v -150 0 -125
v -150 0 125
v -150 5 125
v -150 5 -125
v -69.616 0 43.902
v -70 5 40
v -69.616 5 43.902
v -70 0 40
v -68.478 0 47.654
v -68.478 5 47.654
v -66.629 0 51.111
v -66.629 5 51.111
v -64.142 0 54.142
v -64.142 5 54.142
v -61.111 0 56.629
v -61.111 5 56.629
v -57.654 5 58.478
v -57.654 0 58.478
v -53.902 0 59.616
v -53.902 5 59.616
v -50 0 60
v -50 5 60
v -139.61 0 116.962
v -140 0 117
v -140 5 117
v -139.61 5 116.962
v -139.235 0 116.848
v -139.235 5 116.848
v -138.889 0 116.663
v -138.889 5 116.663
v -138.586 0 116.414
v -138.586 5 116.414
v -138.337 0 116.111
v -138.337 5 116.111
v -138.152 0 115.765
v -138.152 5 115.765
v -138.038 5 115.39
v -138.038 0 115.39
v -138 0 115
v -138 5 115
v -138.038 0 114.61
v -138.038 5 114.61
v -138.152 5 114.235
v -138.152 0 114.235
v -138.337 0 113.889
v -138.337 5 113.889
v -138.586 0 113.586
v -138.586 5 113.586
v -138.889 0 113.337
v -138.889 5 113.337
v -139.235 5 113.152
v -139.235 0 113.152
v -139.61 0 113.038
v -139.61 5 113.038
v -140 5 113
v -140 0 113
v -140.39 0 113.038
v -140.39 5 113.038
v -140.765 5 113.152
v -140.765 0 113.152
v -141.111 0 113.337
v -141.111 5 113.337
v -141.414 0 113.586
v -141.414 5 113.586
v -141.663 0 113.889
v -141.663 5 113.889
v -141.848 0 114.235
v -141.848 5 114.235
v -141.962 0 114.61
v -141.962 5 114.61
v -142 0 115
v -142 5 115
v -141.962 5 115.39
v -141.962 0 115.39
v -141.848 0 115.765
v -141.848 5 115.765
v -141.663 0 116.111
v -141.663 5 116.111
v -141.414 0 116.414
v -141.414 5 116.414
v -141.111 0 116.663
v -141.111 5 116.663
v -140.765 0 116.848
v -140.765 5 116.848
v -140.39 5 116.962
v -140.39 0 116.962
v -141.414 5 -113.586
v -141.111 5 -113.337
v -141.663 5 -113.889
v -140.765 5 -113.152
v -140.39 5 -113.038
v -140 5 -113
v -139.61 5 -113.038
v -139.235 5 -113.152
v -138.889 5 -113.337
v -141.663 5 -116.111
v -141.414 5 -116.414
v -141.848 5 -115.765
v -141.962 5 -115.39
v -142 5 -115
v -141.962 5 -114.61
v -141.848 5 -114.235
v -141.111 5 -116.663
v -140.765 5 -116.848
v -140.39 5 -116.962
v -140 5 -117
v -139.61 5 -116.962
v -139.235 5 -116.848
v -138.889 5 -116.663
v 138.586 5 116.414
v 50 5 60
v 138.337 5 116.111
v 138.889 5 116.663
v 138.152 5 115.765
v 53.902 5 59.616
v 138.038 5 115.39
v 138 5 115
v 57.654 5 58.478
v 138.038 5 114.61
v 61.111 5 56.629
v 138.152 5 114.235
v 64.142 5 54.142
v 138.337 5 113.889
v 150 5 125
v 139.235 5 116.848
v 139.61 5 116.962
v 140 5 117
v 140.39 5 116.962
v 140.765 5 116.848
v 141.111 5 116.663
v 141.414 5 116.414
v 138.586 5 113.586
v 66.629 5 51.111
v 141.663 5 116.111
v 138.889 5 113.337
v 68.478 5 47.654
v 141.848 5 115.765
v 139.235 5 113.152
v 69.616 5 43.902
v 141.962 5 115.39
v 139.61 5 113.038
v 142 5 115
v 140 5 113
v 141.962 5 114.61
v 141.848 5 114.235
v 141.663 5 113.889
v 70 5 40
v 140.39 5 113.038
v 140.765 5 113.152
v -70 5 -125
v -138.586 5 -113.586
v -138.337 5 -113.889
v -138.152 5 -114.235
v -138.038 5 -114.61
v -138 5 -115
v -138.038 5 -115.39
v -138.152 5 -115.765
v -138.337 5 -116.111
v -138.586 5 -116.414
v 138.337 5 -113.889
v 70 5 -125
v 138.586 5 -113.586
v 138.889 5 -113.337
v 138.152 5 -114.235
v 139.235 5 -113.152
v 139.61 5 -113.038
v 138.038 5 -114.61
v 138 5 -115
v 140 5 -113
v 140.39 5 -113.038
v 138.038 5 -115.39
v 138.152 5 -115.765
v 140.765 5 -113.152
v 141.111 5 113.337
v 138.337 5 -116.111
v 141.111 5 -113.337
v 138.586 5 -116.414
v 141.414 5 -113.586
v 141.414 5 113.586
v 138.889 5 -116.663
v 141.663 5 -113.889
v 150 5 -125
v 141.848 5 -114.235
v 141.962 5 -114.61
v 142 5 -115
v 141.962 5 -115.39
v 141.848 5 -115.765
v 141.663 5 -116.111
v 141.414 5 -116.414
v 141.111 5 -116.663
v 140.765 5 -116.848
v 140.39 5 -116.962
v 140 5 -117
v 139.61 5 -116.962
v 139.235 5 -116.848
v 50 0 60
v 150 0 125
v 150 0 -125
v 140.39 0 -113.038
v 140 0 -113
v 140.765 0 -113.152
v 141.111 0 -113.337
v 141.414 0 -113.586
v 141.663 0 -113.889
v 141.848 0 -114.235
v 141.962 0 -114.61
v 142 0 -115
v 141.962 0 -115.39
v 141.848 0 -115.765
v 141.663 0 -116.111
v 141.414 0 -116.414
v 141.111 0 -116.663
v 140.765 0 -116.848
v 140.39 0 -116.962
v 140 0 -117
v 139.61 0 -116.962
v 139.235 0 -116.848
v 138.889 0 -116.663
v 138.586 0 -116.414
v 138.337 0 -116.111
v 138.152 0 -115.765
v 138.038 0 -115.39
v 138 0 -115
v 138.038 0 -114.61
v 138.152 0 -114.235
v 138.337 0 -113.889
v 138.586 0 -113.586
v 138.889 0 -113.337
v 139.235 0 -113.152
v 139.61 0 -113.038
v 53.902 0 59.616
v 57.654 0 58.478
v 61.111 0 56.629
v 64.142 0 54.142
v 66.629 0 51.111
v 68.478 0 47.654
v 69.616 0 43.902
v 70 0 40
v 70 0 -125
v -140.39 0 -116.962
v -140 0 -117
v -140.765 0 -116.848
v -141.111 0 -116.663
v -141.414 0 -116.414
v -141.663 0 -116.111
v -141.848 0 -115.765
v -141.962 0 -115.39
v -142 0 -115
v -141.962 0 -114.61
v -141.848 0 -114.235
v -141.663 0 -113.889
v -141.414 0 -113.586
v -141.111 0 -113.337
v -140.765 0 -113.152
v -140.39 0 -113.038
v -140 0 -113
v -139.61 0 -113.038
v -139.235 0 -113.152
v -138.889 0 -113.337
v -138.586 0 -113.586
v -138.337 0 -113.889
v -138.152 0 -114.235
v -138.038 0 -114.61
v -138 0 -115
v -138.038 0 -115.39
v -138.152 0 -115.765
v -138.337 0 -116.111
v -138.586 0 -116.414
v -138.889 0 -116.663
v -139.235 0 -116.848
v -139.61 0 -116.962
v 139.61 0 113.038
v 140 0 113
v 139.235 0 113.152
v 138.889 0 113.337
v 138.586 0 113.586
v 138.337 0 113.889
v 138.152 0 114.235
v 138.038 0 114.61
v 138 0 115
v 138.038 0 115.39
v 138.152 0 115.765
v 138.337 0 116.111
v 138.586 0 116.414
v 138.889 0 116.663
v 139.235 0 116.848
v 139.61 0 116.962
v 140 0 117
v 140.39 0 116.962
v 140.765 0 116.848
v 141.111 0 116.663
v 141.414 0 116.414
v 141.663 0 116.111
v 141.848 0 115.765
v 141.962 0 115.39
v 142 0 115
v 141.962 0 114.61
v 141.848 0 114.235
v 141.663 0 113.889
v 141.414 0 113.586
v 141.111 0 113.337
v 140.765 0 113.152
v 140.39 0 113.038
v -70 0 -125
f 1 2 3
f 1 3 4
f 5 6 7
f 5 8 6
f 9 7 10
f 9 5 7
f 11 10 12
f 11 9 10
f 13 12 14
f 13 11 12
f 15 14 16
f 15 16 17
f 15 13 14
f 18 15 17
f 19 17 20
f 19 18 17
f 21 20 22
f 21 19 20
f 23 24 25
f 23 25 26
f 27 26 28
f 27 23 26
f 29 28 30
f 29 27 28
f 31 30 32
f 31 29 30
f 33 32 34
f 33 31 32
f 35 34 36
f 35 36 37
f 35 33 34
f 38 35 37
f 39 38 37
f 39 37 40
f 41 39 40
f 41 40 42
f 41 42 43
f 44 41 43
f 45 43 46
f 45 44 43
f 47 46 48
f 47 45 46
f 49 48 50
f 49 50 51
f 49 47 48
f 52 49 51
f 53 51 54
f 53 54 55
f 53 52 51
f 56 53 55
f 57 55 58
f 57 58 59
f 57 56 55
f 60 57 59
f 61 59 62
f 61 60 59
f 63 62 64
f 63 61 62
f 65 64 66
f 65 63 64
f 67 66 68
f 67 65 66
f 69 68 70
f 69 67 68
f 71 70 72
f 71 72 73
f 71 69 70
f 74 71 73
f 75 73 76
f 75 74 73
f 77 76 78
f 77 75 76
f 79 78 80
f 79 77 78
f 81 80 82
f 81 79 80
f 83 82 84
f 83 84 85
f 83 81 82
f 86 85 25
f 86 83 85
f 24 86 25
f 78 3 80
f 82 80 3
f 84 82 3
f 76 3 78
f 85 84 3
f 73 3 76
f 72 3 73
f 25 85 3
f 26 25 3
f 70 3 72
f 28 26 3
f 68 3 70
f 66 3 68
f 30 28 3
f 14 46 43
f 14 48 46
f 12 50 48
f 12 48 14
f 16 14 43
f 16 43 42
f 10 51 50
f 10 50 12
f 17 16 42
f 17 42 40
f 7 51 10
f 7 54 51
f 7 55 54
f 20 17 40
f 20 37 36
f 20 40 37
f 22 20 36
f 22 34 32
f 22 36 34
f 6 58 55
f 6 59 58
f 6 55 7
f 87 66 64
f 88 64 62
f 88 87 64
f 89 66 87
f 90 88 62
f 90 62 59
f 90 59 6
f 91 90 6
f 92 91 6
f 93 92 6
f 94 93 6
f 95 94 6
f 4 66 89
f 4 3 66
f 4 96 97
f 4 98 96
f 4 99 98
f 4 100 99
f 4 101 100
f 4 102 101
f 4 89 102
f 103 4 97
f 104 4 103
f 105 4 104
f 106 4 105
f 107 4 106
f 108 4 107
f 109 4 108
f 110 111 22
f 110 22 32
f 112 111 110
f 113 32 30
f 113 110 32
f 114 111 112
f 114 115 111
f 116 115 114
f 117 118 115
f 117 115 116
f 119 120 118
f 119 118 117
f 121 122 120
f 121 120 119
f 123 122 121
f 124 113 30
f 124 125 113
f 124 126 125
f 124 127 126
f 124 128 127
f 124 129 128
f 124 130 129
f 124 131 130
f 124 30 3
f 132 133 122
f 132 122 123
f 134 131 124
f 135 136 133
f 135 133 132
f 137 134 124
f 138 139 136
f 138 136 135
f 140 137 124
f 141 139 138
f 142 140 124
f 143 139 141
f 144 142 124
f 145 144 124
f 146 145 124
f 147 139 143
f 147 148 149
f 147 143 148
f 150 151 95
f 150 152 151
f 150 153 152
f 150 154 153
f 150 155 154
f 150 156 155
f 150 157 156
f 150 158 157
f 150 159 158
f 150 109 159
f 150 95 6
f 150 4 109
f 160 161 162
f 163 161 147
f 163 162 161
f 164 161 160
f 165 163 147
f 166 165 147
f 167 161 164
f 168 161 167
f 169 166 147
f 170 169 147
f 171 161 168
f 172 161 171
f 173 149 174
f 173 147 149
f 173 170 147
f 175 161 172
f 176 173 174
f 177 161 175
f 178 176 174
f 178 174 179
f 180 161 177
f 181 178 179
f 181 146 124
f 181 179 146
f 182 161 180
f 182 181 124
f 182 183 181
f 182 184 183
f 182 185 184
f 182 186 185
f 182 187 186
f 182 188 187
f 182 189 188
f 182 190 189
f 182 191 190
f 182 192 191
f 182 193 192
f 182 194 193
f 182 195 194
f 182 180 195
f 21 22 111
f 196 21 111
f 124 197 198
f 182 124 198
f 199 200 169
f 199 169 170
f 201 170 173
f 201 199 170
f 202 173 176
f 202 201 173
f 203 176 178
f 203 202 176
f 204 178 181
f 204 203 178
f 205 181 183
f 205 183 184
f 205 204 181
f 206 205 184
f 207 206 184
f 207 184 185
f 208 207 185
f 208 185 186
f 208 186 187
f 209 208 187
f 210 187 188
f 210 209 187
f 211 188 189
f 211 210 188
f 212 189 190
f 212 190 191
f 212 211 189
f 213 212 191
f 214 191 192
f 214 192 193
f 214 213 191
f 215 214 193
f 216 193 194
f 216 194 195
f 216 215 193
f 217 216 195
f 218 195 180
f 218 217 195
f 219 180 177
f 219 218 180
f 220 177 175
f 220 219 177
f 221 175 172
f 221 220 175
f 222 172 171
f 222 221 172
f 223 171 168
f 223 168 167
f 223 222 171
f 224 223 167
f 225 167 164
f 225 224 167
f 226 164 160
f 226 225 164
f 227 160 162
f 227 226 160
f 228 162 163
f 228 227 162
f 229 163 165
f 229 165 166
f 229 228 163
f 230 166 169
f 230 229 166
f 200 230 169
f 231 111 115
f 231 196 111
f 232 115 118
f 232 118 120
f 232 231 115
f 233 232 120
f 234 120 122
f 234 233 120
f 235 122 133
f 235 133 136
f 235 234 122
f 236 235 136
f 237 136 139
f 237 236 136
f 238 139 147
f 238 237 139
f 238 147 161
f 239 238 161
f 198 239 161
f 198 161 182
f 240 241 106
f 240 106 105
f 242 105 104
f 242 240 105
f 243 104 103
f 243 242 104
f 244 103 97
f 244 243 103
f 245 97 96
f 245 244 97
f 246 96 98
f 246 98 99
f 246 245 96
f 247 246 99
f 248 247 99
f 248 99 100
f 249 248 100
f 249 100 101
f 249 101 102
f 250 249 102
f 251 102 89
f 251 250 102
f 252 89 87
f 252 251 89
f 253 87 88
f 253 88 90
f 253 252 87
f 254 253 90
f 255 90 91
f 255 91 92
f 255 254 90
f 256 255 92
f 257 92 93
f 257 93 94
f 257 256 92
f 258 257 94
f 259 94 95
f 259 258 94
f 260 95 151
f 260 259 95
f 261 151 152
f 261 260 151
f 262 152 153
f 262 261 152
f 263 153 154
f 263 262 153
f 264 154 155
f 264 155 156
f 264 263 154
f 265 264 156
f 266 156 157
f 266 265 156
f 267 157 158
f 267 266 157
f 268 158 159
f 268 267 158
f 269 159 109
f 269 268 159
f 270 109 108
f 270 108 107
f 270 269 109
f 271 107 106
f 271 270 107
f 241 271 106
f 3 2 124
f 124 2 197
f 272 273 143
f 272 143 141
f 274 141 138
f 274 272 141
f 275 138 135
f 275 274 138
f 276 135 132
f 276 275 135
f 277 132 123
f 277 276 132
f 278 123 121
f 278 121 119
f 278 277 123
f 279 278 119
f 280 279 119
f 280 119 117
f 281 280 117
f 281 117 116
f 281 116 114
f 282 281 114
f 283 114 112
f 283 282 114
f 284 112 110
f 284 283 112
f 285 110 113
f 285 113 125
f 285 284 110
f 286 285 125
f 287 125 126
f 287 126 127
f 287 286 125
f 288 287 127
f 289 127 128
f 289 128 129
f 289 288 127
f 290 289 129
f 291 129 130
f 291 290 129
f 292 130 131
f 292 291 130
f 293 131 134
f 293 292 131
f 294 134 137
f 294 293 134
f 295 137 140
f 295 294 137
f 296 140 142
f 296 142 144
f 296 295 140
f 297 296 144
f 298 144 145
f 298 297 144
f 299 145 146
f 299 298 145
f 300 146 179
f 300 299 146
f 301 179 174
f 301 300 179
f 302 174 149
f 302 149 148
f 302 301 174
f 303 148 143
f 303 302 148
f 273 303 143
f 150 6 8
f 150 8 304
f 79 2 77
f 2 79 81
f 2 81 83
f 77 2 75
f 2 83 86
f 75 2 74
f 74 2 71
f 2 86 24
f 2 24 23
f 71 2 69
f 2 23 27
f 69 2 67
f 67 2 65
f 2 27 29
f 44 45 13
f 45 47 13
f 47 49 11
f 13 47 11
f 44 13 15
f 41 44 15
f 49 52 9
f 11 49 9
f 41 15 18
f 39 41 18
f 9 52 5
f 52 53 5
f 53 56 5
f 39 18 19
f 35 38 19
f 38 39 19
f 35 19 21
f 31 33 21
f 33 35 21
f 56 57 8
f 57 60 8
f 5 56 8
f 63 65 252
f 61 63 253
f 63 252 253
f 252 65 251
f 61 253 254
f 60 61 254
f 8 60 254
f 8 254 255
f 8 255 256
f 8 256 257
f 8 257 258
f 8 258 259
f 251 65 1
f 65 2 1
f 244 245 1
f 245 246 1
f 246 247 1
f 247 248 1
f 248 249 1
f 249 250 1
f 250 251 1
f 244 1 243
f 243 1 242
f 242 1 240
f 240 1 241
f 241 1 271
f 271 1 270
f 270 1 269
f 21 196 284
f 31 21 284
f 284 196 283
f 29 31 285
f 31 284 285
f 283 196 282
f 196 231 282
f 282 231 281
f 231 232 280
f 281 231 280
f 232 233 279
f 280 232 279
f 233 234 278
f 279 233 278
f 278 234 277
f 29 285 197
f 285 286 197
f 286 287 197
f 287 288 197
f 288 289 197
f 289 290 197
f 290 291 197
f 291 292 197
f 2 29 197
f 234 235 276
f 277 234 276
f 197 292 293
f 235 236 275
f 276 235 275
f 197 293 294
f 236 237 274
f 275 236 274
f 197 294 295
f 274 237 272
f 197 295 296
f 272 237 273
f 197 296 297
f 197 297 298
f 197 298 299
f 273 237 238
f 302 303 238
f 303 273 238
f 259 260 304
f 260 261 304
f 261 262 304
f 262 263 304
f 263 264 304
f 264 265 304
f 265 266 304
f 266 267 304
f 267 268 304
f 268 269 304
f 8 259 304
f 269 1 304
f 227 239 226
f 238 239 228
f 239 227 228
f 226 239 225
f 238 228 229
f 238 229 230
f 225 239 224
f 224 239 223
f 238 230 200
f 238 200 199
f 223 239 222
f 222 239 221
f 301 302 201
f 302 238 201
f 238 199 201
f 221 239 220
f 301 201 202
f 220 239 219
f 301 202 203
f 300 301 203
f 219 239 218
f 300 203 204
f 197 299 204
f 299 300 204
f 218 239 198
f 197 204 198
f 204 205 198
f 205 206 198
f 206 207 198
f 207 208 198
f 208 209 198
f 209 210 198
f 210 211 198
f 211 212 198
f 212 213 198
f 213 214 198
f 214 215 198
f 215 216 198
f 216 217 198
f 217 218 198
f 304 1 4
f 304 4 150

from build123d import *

# Parameters (mm, degrees)
SKETCH1_W           = 300
SKETCH1_H           = 250
SKETCH1_R           = 2
BOSS_EXTRUDE1_DEPTH = 5
SKETCH2_W           = 140
SKETCH2_H           = 185
CUT_EXTRUDE1_DEPTH  = 196.320249846
FILLET1_R           = 20


with BuildPart() as part:
    # Sketch1 → Boss-Extrude1 (new body)
    with BuildSketch(Plane(origin=(0, 0, 0), x_dir=(1, 0, 0), z_dir=(0, 1, 0))):
        Rectangle(SKETCH1_W, SKETCH1_H)
        with Locations(Location((-140, -115, 0), (0, 0, 270))):
            Circle(SKETCH1_R, mode=Mode.SUBTRACT)
        with Locations(Location((-140, 115, 0), (0, 0, 90))):
            Circle(SKETCH1_R, mode=Mode.SUBTRACT)
        with Locations(Location((140, -115, 0), (0, 0, 90))):
            Circle(SKETCH1_R, mode=Mode.SUBTRACT)
        with Locations(Location((140, 115, 0), (0, 0, 270))):
            Circle(SKETCH1_R, mode=Mode.SUBTRACT)
    extrude(amount=BOSS_EXTRUDE1_DEPTH)

    # Sketch2 → Cut-Extrude1 (cut, through all)
    with BuildSketch(Plane(origin=(0, 5, 0), x_dir=(1, 0, 0), z_dir=(0, 1, 0))):
        with Locations((0, 32.5)):
            Rectangle(SKETCH2_W, SKETCH2_H)
    extrude(amount=-CUT_EXTRUDE1_DEPTH, mode=Mode.SUBTRACT)

    # Fillet1
    fillet1_edges = [part.edges().sort_by_distance(p)[0] for p in [
        (-70, 2.5, 60),
        (70, 2.5, 60),
    ]]
    fillet(fillet1_edges, radius=FILLET1_R)


solid = part.part
